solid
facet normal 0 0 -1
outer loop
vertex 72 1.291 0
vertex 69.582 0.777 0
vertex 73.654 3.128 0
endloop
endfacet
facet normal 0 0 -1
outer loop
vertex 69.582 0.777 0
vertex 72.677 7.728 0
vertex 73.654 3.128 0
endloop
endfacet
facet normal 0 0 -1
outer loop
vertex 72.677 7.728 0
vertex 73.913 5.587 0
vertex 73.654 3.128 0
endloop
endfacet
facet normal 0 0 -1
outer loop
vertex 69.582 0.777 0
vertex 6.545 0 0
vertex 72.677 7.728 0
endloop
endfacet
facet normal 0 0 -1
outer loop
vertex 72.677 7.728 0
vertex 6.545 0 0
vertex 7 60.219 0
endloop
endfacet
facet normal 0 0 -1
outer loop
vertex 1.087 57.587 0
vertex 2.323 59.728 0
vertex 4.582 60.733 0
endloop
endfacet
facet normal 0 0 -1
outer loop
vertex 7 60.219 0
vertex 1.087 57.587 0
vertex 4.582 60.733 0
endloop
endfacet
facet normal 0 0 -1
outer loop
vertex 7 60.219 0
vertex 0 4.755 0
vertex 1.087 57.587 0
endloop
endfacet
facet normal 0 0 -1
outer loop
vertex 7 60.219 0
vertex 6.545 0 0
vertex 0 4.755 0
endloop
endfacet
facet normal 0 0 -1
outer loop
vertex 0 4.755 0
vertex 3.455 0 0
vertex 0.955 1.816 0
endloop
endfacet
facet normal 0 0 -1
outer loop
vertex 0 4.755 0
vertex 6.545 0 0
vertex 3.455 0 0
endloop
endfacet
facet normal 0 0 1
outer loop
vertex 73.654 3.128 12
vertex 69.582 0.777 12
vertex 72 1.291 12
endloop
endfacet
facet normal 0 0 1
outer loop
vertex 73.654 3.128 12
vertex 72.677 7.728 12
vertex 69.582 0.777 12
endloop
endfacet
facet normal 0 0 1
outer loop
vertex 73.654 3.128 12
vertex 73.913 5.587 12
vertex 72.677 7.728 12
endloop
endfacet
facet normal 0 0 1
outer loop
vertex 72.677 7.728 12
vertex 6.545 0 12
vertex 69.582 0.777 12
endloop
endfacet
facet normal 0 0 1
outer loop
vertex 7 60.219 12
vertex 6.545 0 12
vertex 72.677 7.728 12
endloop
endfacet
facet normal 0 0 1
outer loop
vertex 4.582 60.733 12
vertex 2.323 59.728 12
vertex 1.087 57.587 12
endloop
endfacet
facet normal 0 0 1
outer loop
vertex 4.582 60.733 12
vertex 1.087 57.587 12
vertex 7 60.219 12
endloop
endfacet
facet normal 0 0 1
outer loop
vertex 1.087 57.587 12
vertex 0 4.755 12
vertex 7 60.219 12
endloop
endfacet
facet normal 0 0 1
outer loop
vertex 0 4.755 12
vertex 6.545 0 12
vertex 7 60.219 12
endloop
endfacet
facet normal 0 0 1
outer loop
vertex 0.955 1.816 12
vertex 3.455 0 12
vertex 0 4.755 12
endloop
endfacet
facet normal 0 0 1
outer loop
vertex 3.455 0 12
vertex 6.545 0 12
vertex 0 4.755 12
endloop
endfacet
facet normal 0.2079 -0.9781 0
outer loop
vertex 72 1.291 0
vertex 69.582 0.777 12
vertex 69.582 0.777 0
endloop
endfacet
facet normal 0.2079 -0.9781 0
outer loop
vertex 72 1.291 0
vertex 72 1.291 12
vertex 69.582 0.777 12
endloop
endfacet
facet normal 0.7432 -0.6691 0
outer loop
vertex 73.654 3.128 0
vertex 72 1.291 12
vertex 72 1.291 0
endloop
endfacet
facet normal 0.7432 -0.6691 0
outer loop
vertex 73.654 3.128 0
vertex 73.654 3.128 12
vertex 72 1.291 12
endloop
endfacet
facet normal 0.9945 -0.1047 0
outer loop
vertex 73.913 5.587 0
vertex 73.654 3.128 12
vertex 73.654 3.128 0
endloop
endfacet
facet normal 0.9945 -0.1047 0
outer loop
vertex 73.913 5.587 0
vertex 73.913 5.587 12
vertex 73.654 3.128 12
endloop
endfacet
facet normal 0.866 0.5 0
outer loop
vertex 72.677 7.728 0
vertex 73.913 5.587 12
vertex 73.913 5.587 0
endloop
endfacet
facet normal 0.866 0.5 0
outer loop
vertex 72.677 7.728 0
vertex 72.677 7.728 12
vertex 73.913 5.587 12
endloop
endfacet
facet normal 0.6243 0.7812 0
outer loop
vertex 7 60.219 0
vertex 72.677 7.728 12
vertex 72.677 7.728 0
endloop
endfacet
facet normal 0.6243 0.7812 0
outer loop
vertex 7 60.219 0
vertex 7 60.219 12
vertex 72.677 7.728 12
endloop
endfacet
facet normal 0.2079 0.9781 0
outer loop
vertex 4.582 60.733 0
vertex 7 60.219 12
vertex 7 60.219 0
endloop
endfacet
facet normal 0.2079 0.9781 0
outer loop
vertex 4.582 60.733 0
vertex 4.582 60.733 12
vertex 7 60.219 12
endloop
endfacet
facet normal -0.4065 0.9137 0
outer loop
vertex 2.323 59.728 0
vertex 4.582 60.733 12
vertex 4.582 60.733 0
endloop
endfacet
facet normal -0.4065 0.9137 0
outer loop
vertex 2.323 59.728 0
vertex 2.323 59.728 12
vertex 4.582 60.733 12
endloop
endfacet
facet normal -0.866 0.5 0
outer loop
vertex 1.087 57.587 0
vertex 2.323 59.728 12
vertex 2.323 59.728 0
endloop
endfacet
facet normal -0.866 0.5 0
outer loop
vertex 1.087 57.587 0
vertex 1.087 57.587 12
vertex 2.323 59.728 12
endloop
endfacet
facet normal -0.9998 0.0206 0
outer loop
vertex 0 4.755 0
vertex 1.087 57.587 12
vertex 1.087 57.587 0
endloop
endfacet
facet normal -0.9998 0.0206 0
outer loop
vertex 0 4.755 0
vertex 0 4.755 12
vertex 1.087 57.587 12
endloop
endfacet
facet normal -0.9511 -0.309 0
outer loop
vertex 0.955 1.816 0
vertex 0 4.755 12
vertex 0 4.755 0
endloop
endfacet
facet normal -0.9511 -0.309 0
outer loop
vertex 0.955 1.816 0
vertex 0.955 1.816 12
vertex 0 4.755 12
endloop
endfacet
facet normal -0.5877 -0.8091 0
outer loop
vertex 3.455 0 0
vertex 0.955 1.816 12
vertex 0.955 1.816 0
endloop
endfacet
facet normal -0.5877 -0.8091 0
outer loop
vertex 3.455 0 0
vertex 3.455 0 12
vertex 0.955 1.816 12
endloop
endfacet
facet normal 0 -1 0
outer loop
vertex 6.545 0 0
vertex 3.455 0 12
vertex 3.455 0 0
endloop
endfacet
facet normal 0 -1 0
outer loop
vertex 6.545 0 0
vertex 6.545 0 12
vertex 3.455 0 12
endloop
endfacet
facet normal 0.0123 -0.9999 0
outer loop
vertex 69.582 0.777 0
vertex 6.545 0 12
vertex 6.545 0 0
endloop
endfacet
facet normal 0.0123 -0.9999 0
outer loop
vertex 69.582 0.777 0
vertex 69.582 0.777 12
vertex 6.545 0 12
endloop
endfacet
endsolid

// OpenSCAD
$fn = 32;

// ----------------------------------------------------------------------
// Lever arm: two bosses 10 and 8 mm, 65 mm between centres
// ----------------------------------------------------------------------

// --- parameters (mm) ---
profile_height = 12;      // extrusion height
profile_points = 13;      // points of the closed outline

profile = [[0, 4.755], [0.955, 1.816], [3.455, 0], [6.545, 0], [69.582, 0.777], [72, 1.291], [73.654, 3.128], [73.913, 5.587], [72.677, 7.728], [7, 60.219], [4.582, 60.733], [2.323, 59.728], [1.087, 57.587]];  // single closed polygon, 13 points, counter clockwise

// --- the one profile operation ---
linear_extrude(height = profile_height) polygon(points = profile);
